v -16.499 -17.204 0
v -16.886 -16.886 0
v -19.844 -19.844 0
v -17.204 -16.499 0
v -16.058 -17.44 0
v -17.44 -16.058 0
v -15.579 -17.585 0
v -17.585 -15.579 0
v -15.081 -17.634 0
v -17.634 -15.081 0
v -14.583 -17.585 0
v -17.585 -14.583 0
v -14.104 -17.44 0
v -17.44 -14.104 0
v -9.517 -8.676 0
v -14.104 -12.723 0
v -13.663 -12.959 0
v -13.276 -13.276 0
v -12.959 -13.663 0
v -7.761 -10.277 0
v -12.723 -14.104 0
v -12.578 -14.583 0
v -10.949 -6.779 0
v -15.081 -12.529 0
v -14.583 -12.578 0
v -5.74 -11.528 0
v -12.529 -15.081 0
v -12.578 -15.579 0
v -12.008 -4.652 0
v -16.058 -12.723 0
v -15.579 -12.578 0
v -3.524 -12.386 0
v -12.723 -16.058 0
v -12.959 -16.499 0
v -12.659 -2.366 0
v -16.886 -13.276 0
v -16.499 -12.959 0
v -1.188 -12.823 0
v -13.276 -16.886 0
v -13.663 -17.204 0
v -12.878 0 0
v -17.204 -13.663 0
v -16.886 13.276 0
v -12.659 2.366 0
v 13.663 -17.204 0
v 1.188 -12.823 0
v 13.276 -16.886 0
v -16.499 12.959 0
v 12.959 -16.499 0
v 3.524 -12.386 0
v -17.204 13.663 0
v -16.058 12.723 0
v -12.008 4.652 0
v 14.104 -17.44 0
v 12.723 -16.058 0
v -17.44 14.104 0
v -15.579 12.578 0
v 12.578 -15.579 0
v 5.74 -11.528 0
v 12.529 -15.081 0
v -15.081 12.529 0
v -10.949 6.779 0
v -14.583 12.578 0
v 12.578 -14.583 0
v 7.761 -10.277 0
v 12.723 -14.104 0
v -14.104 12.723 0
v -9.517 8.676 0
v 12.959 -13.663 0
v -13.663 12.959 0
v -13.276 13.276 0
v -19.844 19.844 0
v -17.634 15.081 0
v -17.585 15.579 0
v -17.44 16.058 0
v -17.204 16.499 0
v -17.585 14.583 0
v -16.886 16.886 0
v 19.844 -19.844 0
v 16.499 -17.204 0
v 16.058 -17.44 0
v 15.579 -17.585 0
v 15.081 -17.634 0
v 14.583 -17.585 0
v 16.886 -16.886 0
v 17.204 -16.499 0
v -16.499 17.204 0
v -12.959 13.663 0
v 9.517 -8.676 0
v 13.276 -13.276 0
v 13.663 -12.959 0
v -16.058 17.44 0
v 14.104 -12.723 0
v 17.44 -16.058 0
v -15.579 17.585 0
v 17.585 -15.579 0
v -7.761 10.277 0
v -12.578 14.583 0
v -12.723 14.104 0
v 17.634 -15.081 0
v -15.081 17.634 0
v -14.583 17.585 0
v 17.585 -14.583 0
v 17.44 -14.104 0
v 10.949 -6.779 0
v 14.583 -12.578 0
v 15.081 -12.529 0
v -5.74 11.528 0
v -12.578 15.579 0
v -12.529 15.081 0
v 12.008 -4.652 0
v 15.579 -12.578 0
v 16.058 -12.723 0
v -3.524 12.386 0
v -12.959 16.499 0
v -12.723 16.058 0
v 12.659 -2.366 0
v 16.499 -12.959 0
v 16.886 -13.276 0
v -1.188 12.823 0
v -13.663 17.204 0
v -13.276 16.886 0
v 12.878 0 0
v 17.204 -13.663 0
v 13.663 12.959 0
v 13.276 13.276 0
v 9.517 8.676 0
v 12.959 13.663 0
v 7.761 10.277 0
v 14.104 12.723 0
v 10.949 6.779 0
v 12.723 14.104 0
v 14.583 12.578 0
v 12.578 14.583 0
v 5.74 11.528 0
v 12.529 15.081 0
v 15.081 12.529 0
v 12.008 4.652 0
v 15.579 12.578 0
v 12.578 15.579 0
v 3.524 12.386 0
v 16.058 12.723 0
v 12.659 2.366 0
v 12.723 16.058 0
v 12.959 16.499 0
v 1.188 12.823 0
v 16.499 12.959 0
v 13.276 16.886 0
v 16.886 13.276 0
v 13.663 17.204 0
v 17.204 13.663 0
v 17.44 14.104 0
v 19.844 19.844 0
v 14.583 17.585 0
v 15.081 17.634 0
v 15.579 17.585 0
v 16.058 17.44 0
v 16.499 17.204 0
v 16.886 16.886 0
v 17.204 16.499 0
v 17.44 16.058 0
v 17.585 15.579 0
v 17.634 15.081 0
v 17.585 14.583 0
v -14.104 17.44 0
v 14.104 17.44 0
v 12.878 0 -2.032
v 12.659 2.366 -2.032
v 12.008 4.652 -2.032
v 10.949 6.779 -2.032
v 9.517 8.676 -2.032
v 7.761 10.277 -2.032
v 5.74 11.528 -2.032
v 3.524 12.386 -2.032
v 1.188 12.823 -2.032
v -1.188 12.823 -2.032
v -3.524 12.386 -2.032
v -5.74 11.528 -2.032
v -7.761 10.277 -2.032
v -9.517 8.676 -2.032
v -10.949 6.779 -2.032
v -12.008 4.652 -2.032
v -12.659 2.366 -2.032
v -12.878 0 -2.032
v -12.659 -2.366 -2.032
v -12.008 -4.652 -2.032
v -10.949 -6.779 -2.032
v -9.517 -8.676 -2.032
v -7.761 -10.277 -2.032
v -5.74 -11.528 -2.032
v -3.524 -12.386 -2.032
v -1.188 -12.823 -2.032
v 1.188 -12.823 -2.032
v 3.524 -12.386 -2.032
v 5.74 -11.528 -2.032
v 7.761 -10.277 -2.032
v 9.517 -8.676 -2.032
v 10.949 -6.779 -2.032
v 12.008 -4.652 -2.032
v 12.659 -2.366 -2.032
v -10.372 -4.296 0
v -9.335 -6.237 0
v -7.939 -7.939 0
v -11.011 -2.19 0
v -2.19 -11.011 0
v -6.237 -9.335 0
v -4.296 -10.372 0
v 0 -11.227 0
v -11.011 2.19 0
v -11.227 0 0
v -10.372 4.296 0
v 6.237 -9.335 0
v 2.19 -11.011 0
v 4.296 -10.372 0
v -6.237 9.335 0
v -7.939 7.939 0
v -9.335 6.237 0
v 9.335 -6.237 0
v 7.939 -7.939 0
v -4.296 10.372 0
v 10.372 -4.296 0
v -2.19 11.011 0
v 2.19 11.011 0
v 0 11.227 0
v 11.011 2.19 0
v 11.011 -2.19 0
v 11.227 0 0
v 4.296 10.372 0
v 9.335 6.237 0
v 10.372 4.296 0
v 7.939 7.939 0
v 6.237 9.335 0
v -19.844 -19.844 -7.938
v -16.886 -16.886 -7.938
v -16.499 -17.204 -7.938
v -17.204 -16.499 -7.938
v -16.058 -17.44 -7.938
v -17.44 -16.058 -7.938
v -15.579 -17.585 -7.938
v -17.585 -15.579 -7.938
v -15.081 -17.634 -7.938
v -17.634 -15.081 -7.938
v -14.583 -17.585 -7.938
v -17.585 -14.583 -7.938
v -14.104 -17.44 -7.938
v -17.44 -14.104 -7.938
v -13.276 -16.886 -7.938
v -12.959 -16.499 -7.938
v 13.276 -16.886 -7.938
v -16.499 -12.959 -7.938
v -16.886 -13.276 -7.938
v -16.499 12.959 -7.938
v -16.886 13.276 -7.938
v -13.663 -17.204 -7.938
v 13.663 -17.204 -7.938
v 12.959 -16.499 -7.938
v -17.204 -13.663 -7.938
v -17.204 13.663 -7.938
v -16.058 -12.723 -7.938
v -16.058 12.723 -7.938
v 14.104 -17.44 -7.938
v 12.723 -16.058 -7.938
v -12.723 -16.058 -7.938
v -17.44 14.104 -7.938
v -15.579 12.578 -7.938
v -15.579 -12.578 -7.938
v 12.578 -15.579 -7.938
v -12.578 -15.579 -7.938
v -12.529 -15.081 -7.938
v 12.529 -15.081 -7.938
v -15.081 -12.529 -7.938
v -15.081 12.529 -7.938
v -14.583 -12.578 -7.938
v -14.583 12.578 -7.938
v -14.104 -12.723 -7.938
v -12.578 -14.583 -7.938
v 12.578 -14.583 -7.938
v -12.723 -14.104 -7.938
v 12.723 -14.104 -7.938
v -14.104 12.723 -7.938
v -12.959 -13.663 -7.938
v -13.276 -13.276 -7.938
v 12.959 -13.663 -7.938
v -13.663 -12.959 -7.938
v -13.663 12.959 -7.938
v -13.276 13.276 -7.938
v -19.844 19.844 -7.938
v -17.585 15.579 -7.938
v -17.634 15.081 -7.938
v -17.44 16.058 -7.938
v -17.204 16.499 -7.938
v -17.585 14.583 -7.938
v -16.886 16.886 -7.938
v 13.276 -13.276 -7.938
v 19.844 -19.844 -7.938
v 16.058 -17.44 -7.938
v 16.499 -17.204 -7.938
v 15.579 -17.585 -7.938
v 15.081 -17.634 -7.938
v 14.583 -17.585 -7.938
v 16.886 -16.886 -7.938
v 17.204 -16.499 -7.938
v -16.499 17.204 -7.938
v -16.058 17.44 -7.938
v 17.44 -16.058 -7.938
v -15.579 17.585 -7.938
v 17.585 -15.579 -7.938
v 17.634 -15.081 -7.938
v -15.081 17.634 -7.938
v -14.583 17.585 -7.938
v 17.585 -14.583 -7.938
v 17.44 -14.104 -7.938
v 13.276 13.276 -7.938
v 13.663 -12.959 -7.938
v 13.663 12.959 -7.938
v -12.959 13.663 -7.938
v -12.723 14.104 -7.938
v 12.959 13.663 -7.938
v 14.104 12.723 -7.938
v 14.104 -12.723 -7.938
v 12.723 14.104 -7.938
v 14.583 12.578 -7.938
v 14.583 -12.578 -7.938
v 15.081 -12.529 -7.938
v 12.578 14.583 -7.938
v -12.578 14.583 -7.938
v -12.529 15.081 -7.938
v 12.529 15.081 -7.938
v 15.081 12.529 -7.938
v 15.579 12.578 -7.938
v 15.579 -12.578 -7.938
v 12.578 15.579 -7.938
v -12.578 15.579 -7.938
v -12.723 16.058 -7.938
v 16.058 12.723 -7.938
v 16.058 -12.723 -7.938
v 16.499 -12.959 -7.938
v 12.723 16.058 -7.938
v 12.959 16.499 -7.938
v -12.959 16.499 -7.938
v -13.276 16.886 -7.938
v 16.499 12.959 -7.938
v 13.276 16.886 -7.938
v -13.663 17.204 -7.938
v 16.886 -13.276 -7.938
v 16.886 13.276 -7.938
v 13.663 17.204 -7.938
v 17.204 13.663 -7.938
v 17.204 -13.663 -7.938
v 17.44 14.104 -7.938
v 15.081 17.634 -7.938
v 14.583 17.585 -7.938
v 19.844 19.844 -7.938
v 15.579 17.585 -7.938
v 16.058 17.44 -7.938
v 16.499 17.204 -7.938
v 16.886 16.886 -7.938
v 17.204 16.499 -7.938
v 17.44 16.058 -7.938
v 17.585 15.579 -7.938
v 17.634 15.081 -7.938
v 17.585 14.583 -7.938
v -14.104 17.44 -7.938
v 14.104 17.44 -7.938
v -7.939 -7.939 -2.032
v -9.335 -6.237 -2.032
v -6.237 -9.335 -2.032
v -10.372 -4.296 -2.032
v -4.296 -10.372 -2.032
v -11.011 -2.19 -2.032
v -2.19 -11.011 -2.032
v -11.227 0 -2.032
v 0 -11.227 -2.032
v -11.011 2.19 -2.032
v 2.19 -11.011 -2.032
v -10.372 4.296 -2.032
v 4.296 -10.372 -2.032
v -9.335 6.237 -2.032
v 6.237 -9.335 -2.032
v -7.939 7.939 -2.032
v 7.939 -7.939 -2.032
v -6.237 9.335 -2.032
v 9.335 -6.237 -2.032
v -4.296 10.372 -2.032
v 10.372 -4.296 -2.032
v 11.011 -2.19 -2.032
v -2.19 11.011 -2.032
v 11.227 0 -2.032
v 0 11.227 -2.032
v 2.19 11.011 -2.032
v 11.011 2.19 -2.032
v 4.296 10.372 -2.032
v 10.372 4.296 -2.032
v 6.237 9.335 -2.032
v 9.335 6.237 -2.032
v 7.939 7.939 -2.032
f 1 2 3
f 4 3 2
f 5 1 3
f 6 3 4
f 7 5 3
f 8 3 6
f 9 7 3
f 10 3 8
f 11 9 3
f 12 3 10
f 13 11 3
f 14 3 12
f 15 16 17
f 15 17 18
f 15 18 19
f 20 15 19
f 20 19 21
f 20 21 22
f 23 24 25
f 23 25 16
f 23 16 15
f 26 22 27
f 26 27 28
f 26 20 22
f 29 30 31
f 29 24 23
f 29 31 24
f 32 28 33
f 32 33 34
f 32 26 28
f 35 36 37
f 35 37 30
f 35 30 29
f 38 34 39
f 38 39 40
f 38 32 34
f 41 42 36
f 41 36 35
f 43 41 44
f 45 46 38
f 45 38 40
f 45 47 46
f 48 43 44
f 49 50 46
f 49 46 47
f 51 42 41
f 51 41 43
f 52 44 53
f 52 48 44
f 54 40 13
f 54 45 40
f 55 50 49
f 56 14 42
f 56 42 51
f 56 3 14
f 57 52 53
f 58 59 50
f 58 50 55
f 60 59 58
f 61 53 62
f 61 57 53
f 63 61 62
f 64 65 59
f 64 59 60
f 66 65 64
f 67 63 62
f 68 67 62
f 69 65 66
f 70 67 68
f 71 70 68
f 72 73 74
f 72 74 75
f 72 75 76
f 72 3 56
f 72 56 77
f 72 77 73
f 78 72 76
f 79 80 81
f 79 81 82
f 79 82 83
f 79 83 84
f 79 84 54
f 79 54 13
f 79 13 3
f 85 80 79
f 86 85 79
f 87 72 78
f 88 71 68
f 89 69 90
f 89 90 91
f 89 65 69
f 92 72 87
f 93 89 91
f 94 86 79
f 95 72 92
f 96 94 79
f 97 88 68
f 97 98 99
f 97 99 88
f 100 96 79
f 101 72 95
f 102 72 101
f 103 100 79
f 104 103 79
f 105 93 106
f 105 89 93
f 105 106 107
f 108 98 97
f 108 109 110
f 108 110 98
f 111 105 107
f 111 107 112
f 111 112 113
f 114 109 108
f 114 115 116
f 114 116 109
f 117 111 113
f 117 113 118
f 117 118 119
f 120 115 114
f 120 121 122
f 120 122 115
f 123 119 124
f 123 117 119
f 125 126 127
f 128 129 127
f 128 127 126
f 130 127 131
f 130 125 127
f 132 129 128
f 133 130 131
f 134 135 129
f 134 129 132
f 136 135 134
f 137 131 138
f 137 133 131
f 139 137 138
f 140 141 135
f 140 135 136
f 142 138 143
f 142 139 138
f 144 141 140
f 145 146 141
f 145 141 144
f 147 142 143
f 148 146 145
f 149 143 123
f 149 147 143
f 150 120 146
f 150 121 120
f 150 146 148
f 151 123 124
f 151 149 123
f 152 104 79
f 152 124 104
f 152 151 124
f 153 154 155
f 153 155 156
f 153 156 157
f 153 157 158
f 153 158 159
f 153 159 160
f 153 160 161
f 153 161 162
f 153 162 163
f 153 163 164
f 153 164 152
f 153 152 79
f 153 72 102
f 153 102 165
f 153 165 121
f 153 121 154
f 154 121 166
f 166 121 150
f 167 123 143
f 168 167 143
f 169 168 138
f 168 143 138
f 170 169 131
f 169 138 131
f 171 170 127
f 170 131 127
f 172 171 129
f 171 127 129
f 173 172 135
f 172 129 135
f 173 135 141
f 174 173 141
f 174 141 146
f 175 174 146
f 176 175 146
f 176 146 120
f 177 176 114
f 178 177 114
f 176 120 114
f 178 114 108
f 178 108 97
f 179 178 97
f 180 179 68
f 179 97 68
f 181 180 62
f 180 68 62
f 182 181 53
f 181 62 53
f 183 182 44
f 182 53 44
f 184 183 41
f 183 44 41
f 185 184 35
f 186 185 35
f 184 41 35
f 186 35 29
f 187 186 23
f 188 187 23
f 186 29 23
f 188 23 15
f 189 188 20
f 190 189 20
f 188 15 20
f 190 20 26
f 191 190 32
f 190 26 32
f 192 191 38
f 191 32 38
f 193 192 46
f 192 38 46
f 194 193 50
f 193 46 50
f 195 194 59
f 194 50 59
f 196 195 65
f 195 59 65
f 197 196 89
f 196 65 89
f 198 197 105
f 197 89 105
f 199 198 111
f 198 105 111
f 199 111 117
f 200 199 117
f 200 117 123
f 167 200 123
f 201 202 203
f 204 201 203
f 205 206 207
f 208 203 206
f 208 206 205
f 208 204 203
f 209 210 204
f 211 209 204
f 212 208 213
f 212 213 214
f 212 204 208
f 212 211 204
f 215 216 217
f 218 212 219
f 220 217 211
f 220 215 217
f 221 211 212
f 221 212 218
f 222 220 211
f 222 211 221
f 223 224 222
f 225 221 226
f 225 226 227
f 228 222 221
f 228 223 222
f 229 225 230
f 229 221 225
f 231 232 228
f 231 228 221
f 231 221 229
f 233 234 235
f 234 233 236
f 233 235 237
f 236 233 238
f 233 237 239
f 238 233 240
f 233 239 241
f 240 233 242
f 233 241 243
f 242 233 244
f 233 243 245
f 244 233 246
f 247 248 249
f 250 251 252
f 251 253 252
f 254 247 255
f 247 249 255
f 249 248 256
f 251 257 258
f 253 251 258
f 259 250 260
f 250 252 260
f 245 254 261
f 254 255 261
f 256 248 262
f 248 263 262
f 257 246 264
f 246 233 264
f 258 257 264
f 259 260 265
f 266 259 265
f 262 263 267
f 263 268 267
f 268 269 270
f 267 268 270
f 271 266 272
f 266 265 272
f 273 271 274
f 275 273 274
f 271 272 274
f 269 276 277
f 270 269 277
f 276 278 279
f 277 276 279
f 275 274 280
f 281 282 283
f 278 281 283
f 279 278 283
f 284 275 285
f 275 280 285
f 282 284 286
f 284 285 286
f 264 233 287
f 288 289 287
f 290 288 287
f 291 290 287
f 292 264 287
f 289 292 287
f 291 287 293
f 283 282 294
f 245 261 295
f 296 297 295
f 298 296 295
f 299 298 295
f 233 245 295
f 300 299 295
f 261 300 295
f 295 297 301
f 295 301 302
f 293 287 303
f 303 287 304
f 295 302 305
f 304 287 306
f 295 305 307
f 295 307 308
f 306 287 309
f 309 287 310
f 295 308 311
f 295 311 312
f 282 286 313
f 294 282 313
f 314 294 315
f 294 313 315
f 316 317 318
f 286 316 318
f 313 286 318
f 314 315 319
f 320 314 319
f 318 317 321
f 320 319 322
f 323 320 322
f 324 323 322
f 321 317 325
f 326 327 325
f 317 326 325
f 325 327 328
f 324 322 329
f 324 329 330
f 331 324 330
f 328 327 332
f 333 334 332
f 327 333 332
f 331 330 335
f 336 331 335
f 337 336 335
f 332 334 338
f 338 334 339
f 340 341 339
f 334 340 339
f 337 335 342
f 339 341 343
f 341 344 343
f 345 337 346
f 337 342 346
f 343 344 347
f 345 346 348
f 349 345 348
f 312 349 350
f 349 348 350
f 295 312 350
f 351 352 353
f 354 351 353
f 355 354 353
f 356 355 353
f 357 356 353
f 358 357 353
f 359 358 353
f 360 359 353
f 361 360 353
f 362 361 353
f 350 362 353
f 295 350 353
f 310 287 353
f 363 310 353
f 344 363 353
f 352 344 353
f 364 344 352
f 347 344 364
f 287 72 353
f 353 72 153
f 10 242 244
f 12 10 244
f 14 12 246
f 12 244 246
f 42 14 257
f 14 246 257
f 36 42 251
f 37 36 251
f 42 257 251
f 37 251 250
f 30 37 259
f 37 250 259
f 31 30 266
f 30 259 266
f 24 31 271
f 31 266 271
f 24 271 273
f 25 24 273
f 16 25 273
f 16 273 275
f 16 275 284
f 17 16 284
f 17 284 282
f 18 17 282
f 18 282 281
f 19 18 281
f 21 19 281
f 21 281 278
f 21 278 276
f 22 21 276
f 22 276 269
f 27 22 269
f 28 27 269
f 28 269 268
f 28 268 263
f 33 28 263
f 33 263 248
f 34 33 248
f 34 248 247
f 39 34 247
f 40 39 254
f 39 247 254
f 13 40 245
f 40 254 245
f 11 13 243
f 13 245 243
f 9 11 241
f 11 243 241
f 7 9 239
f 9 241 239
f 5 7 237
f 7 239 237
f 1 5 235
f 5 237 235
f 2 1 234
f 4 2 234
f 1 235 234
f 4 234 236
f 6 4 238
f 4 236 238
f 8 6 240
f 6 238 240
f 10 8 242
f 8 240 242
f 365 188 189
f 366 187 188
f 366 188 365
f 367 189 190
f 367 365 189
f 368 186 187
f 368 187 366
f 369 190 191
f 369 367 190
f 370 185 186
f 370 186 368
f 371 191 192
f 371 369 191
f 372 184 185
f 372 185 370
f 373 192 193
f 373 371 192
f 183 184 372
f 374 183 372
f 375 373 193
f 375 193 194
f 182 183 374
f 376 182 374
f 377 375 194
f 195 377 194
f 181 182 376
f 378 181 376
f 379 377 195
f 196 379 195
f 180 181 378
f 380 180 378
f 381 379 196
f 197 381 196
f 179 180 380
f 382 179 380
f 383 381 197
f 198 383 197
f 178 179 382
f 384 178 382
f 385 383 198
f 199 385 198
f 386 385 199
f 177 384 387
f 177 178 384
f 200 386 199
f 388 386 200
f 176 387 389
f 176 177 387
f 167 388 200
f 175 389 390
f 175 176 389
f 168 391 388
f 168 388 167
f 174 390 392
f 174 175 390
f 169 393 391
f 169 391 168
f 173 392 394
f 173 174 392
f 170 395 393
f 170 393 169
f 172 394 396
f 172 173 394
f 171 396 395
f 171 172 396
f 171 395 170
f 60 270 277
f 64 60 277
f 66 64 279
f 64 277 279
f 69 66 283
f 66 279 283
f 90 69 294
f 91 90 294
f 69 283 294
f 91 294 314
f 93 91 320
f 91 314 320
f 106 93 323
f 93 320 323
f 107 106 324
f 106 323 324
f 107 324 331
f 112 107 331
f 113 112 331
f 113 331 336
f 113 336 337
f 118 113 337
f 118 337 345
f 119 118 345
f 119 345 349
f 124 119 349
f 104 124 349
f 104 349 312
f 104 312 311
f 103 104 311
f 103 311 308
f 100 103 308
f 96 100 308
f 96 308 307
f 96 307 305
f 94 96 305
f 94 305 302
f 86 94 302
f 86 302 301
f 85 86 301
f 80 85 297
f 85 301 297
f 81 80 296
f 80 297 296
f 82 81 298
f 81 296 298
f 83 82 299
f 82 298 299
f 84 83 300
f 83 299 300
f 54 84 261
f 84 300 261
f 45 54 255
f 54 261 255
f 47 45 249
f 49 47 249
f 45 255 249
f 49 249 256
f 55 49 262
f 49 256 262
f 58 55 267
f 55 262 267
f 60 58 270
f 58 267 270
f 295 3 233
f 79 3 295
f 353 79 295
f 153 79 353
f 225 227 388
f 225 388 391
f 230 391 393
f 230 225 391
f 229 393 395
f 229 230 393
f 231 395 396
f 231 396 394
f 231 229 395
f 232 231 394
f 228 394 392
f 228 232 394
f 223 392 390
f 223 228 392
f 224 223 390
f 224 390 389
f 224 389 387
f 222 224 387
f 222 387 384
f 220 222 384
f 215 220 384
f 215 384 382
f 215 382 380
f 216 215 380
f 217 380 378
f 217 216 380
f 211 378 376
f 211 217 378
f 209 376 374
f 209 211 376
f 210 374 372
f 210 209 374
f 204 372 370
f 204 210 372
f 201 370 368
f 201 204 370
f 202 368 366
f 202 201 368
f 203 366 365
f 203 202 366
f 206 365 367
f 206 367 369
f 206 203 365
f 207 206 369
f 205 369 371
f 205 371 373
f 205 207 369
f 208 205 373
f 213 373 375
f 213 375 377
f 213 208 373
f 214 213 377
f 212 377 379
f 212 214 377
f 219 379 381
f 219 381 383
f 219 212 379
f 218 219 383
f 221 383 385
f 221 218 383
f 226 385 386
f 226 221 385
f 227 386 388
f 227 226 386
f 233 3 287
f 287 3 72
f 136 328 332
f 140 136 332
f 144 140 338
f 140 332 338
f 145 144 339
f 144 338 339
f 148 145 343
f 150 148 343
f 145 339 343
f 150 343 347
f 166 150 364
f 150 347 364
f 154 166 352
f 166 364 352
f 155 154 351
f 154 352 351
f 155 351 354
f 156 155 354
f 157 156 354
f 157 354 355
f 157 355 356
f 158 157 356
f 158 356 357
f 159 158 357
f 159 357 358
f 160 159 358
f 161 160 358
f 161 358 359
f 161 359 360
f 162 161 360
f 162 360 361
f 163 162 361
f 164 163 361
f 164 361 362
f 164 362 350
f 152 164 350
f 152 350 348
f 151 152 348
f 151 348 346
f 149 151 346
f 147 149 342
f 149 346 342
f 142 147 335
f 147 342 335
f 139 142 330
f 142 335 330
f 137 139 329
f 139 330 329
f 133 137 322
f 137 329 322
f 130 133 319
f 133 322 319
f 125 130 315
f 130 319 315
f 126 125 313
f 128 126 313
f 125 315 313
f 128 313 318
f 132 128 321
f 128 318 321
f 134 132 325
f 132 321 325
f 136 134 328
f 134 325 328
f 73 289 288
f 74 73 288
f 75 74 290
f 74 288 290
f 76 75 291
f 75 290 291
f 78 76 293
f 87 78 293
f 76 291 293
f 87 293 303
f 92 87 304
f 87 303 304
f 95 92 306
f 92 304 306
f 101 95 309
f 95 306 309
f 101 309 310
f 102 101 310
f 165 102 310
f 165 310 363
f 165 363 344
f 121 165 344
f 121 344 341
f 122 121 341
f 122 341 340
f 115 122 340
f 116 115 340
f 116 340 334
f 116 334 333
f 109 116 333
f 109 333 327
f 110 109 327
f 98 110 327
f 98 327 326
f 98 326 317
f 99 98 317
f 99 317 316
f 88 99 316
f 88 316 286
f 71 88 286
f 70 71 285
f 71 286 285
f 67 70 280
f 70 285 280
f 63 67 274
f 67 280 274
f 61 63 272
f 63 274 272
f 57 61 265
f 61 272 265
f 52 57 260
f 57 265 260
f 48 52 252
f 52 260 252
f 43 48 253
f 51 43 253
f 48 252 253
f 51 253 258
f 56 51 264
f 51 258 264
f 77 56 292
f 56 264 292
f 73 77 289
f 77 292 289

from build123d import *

# Parameters (mm, degrees)
F0_W     = 39.6875
F0_H     = 39.6875
F0_R     = 12.8778
F0_R_2   = 11.2268
F1_DEPTH = 7.9375
F2_DEPTH = 2.032
F3_D     = 5.1054


with BuildPart() as f1:
    # F0 (on Top) → F1 (new body)
    with BuildSketch(Plane.XY):
        Rectangle(F0_W, F0_H)
        Circle(F0_R, mode=Mode.SUBTRACT)
        Circle(F0_R)
        Circle(F0_R_2, mode=Mode.SUBTRACT)
        Circle(F0_R_2)
    extrude(amount=-F1_DEPTH)

    # F0 (on Top) → F2 (cut)
    with BuildSketch(Plane.XY):
        Circle(F0_R)
        Circle(F0_R_2, mode=Mode.SUBTRACT)
    extrude(amount=-F2_DEPTH, mode=Mode.SUBTRACT)

    # F3 (through all)
    with Locations(Plane.XY):
        with Locations((-15.08125, 15.08125), (15.08125, 15.08125), (15.08125, -15.08125), (-15.08125, -15.08125)):
            Hole(F3_D / 2)


solid = f1.part
